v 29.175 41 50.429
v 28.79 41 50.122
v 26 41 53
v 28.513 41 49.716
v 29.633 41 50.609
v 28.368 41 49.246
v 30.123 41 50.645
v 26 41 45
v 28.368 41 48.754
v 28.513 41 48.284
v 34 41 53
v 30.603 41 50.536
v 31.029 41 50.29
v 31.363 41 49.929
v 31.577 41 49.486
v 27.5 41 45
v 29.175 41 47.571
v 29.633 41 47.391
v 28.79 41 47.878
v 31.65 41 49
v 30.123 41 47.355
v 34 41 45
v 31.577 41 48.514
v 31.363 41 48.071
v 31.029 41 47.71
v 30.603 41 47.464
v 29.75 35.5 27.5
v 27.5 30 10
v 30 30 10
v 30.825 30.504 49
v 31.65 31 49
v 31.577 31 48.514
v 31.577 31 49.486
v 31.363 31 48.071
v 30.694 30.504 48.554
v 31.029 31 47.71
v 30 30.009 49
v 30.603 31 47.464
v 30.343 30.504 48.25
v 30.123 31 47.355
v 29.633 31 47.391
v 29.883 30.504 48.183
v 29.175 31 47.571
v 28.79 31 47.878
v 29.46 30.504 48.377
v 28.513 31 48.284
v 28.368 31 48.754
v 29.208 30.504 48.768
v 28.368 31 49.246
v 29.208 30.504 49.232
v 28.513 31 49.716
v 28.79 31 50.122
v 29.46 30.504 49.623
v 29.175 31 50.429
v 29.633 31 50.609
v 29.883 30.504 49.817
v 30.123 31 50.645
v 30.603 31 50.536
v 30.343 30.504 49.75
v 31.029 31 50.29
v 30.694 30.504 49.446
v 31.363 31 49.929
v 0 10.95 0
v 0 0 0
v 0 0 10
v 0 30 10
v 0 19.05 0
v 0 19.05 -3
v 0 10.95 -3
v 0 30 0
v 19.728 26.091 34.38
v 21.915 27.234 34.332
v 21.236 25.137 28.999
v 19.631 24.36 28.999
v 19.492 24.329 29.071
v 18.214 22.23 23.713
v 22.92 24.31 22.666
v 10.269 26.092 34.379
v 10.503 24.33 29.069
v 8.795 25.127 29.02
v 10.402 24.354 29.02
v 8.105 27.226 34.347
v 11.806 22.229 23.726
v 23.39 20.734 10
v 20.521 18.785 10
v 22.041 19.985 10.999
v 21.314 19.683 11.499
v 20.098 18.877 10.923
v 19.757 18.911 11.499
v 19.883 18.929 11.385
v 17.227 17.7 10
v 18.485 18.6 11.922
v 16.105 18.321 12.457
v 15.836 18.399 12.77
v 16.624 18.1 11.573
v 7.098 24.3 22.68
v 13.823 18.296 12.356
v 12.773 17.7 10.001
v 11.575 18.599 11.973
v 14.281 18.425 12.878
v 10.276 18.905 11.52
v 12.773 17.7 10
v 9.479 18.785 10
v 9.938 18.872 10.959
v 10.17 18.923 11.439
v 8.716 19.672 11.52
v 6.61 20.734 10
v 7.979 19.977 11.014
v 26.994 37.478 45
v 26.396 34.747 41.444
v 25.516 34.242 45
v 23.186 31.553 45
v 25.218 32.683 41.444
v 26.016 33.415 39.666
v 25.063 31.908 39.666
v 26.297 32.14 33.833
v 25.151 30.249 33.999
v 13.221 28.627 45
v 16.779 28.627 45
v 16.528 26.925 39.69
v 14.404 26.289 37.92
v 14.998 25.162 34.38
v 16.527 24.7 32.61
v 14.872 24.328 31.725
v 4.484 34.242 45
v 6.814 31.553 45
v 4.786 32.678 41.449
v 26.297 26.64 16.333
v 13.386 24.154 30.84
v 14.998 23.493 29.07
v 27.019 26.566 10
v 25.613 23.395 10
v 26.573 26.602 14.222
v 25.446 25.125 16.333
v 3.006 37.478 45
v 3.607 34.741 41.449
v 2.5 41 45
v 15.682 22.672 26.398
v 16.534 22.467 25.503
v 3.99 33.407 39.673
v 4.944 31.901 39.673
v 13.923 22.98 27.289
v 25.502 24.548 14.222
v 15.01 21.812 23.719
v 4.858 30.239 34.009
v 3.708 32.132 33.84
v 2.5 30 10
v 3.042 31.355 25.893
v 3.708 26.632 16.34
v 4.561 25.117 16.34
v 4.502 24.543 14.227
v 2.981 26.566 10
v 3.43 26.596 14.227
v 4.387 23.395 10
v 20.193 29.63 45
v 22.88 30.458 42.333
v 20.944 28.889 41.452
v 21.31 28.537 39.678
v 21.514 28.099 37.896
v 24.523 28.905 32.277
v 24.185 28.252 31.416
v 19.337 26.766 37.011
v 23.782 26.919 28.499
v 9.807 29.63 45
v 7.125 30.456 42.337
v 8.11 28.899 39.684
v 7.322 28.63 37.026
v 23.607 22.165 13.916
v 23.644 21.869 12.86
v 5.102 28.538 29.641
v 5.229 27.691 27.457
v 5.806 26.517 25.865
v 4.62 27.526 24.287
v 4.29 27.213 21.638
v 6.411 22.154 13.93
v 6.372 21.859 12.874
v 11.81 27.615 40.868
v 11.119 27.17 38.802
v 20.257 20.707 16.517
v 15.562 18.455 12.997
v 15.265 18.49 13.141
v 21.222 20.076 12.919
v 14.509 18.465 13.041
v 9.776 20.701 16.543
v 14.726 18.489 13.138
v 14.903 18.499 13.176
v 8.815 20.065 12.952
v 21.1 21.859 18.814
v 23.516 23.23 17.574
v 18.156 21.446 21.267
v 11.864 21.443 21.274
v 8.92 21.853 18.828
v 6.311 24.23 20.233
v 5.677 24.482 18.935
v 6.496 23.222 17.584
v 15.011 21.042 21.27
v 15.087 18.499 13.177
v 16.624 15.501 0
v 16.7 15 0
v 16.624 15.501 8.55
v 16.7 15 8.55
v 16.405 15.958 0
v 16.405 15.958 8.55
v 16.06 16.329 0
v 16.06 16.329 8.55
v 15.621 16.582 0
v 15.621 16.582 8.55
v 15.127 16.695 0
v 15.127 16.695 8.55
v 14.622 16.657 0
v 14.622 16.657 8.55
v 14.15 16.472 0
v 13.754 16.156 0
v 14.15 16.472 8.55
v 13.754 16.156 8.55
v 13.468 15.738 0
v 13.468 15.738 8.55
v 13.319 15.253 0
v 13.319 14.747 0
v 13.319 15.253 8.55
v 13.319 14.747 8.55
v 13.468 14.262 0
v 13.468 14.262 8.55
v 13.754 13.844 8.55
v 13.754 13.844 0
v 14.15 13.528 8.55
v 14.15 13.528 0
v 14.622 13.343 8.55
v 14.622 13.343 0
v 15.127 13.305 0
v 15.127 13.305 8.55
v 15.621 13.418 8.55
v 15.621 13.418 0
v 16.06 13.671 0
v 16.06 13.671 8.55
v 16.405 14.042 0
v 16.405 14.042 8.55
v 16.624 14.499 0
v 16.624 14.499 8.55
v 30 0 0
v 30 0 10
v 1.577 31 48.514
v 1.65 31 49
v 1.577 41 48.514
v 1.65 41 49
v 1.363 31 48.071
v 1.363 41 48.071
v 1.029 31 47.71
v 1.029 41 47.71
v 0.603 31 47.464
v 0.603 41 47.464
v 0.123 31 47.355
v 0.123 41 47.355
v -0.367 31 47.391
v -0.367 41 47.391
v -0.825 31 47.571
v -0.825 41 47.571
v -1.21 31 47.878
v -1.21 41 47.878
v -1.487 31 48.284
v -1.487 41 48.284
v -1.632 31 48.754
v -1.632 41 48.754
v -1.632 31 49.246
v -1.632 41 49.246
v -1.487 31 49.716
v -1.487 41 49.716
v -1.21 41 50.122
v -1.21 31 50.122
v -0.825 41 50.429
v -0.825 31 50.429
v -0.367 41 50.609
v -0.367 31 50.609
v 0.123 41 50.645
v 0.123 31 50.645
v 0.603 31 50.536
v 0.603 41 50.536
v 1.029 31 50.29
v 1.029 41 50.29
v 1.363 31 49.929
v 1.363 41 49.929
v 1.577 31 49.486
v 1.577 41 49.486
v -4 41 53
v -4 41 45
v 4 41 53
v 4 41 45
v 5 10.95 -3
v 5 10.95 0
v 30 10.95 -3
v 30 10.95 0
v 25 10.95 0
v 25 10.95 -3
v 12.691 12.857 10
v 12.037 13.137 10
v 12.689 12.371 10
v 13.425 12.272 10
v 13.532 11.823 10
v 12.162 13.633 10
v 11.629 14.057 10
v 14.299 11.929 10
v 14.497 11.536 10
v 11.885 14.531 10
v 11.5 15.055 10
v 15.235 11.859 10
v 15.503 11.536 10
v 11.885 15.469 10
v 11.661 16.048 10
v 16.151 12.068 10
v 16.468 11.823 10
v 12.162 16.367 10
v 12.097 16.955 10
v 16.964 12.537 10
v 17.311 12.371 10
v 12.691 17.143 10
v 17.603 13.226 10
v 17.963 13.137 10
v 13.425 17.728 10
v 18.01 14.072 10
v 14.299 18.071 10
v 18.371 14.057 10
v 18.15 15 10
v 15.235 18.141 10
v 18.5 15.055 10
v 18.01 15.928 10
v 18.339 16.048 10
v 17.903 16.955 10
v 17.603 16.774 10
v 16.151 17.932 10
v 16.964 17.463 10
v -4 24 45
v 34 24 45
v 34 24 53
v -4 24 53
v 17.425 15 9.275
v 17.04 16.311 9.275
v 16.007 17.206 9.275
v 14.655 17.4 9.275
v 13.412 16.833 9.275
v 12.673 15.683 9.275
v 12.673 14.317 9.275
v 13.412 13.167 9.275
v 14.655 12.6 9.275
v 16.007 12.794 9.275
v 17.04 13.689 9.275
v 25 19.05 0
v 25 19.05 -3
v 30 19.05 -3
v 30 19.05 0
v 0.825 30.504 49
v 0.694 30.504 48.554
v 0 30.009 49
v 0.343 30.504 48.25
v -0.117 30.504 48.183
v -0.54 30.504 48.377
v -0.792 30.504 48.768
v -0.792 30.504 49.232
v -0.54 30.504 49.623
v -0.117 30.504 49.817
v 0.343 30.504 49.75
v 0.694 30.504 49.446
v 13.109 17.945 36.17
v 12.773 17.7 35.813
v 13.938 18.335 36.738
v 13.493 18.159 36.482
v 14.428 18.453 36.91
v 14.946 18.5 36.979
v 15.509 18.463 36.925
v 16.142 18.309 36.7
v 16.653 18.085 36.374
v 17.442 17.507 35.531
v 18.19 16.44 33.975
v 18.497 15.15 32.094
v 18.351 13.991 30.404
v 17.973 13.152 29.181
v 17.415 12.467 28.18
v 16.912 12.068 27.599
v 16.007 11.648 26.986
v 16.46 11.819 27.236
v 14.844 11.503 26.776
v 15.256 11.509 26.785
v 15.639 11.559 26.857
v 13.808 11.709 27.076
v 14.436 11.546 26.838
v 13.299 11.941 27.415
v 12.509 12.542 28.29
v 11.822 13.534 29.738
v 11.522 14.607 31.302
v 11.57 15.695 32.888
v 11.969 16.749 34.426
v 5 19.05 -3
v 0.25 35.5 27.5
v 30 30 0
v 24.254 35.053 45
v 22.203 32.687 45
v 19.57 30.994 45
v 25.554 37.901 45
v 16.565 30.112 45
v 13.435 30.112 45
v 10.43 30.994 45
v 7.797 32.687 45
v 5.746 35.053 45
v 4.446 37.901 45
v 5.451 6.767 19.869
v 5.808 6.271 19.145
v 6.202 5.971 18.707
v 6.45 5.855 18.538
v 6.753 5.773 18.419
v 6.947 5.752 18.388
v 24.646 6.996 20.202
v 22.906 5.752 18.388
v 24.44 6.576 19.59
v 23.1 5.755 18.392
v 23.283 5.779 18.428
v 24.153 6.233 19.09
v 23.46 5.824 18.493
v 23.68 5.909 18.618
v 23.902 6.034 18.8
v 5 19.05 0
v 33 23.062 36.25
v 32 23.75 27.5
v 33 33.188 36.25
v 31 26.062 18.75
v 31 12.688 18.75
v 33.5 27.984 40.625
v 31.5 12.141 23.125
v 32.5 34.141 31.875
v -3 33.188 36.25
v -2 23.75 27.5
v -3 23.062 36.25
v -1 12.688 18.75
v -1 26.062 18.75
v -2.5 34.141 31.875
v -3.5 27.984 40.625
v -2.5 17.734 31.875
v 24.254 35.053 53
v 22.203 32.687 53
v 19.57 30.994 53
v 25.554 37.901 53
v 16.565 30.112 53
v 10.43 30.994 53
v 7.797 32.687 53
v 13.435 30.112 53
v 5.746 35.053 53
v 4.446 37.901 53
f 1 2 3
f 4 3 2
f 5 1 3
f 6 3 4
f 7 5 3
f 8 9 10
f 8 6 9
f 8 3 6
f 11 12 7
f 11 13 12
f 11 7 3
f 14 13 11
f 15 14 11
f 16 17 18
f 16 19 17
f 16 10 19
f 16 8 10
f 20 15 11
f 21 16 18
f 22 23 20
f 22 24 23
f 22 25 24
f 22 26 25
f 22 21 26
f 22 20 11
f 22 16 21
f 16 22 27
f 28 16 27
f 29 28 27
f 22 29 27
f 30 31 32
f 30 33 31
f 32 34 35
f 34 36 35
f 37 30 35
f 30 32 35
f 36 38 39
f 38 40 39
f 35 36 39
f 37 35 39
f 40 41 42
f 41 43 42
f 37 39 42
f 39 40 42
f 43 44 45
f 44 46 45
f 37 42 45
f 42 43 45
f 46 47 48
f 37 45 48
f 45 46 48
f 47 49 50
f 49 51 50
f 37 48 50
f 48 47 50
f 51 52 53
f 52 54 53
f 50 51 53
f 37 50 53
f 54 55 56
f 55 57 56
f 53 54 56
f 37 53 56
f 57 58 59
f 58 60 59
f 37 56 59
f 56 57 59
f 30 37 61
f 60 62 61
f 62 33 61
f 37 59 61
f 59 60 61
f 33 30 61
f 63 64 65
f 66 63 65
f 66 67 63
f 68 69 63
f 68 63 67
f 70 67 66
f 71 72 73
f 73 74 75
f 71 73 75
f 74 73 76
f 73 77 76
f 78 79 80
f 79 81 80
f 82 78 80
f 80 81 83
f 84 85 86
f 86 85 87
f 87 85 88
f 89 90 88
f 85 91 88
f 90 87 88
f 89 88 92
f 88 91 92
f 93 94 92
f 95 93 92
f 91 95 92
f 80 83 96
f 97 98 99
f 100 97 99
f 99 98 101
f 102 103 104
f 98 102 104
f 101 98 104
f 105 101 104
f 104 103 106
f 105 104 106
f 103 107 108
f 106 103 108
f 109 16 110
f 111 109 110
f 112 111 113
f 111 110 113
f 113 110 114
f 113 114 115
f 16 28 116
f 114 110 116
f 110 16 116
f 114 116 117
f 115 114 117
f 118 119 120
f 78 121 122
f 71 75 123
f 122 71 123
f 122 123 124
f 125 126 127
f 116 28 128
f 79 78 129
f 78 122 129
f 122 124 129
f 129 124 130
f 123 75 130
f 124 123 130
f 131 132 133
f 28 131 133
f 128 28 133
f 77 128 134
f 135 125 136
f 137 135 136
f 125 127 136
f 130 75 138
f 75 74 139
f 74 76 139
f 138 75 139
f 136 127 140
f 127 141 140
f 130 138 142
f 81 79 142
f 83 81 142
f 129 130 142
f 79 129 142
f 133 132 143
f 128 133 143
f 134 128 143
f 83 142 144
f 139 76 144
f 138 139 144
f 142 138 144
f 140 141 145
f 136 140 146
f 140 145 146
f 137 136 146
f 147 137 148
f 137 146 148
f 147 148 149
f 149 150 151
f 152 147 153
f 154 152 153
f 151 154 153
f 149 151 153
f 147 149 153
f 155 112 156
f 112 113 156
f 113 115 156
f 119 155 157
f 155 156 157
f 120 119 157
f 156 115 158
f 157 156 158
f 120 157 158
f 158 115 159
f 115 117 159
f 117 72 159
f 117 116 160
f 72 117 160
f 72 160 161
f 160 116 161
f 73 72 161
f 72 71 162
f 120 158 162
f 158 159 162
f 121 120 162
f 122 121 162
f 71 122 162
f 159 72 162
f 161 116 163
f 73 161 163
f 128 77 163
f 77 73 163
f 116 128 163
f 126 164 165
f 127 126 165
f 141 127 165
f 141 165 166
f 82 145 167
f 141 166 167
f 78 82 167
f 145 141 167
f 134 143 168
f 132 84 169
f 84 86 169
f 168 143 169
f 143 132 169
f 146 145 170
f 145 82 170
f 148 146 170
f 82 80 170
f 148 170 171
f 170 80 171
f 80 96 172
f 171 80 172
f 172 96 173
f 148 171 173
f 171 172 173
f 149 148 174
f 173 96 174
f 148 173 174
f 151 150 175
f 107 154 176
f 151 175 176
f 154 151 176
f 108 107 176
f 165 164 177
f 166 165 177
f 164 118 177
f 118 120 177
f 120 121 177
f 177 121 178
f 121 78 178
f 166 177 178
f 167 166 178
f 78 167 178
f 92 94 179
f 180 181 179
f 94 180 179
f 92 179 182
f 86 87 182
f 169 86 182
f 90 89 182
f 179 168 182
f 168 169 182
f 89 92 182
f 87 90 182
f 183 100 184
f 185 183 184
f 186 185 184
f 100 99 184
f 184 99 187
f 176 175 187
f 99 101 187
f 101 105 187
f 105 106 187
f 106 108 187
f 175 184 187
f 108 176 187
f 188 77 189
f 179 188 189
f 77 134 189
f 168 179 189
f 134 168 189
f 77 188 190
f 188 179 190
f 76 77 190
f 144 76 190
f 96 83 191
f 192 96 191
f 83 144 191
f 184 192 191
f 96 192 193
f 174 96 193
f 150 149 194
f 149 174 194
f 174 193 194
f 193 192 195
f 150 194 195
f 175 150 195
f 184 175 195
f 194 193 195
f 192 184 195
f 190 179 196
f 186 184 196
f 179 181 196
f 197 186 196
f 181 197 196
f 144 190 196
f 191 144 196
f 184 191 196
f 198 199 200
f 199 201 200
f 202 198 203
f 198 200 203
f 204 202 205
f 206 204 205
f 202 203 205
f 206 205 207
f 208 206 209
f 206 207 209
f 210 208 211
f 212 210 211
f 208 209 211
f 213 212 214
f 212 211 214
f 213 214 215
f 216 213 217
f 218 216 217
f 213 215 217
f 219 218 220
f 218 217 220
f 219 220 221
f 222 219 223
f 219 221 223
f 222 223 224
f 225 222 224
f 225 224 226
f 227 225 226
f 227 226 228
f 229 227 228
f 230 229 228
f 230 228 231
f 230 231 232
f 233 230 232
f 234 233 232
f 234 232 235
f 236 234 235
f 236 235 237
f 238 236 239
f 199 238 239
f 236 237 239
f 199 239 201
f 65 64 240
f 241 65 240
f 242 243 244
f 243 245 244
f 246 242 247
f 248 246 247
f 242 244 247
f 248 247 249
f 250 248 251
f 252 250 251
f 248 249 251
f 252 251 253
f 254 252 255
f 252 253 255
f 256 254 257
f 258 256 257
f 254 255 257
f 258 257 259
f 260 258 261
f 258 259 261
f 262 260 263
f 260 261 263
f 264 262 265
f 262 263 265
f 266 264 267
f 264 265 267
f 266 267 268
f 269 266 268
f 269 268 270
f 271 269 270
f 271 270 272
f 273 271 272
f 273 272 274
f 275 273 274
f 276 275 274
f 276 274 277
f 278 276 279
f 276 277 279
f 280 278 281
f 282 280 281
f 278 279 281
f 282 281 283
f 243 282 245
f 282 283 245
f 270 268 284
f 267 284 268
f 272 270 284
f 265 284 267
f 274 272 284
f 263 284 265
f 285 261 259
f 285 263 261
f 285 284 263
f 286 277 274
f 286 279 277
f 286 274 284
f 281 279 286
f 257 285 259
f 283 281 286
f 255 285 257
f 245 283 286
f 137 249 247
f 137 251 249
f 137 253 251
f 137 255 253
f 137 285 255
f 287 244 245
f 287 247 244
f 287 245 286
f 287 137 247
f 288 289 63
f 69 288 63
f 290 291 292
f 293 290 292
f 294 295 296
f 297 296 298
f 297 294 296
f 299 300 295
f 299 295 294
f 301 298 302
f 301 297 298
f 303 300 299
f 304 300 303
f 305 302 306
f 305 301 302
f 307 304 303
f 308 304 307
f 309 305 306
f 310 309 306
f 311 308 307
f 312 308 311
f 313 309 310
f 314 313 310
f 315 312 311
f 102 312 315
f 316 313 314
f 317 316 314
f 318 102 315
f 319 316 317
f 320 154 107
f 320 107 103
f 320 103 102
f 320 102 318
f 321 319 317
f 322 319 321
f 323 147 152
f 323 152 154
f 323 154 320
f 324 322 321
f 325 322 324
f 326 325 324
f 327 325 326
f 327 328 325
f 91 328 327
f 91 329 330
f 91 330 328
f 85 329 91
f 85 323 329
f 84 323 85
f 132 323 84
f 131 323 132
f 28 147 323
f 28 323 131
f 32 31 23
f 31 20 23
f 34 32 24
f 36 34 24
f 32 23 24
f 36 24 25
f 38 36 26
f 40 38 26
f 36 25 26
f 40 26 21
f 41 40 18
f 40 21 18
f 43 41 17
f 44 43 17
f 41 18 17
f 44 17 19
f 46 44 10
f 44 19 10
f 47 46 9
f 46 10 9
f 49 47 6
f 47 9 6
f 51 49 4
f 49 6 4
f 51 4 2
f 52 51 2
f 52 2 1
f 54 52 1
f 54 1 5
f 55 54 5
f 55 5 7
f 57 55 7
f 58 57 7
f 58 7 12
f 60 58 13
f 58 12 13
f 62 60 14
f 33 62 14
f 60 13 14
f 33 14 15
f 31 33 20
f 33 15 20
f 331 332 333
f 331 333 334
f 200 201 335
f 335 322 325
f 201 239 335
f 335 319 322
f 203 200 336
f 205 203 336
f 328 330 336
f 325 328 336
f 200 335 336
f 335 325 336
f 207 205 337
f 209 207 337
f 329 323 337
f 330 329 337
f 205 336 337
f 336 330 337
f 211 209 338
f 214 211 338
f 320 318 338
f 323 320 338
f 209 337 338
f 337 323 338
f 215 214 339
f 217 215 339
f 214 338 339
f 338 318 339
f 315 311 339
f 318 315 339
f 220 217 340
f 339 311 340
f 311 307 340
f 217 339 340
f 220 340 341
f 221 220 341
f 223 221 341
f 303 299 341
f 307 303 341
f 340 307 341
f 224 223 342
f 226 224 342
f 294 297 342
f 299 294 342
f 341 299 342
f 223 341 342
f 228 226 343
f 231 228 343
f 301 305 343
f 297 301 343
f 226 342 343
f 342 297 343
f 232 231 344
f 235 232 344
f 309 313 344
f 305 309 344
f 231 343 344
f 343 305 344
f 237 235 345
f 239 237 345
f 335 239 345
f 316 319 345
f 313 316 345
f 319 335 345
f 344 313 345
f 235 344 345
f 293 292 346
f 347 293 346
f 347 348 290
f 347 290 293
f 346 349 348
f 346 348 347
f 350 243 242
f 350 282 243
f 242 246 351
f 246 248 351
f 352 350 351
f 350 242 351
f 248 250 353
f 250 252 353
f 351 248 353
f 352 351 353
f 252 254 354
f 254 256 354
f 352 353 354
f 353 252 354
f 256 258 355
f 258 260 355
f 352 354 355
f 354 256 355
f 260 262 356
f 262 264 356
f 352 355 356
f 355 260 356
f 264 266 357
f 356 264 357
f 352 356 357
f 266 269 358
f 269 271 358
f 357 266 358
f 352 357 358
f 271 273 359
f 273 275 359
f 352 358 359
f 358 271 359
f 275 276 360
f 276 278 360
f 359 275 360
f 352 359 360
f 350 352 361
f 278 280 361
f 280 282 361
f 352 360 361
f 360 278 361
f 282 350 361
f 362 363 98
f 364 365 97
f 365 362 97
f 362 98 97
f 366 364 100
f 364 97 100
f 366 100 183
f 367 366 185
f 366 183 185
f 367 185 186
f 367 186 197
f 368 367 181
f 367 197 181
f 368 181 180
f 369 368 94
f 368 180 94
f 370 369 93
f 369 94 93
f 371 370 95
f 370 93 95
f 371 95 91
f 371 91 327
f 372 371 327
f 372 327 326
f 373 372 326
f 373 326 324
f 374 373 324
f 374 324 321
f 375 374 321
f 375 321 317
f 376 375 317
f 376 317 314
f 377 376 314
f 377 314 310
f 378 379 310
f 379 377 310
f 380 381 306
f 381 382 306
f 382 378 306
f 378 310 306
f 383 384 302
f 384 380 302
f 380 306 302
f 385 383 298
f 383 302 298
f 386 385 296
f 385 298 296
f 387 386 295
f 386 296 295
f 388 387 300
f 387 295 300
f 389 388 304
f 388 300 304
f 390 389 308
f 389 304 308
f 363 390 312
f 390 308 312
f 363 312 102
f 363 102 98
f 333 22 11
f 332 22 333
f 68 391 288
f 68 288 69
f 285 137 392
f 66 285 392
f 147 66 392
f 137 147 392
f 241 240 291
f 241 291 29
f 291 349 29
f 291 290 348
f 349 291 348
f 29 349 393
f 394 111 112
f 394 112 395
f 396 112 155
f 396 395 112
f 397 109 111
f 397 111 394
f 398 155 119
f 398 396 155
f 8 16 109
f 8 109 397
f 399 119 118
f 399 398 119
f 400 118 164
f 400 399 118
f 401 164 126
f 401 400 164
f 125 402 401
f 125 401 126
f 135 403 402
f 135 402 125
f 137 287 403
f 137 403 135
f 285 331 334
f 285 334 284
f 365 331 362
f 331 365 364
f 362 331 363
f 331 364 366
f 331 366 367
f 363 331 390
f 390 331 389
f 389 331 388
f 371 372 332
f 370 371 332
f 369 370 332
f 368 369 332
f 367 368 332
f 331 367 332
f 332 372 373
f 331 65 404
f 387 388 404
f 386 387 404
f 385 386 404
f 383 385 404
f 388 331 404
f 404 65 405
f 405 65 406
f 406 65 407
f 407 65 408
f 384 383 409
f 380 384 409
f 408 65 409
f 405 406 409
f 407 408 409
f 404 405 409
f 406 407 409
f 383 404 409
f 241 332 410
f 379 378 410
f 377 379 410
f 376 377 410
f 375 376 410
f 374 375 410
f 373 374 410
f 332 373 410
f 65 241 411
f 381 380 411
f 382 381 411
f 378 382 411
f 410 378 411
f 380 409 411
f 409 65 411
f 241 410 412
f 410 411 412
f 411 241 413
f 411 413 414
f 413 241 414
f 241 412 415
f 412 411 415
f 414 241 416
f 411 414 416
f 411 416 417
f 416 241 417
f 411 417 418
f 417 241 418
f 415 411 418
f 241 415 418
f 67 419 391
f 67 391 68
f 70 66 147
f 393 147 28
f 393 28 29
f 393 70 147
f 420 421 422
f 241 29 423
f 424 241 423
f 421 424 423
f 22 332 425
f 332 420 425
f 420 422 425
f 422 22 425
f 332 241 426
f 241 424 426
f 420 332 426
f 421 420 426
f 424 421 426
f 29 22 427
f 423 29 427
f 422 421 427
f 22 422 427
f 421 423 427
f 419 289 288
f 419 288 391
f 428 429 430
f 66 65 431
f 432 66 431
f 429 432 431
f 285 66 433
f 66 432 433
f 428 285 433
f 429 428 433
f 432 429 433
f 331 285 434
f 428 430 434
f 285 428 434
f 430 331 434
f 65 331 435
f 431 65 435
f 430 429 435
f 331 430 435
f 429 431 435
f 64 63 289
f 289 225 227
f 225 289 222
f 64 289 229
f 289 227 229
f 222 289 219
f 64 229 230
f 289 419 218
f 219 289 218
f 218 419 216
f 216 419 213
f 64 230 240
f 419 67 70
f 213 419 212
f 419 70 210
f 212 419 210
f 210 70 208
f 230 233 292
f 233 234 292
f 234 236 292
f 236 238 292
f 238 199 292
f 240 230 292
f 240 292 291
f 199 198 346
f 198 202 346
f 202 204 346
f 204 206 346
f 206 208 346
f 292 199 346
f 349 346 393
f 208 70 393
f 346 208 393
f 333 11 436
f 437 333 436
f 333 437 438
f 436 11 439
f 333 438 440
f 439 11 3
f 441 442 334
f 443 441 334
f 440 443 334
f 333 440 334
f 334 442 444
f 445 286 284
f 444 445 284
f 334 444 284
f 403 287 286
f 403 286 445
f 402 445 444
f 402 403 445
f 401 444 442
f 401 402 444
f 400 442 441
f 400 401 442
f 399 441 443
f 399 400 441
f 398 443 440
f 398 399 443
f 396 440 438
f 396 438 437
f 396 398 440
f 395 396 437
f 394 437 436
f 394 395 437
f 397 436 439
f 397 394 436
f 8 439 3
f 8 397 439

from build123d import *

# Parameters (mm, degrees)
SKETCH_1_W          = 30
SKETCH_1_H          = 30
EXTRUDE_1_DEPTH     = 10
EXTRUDE_3_DEPTH     = 8
SKETCH_11_R         = 3.5
CUT_EXTRUDE_2_DEPTH = 69.45436447
SKETCH_12_W         = 5
SKETCH_12_H         = 8.1
EXTRUDE_4_DEPTH     = 3


with BuildPart() as part:
    # 草图1 → 凸台-拉伸1 (new body)
    with BuildSketch(Plane.XY):
        with Locations((15, 15)):
            Rectangle(SKETCH_1_W, SKETCH_1_H)
    extrude(amount=EXTRUDE_1_DEPTH)

    # 高级异型孔1: read off the stored shape, not the designer's step
    # 高级异型孔1 outline → 高级异型孔1 (revolve, cut)
    with BuildSketch(Plane(origin=(15, 15, 0), x_dir=(1, 0, 0), z_dir=(0, -1, 0))):
        Polygon((3.15, 10), (0, 10), (0, 0), (1.7, 0), (1.7, 8.55), align=None)
    revolve(axis=Axis((15, 15, 0), (0, 0, 1)), mode=Mode.SUBTRACT)



with BuildPart() as body_2:
    # 草图2 → 凸台-拉伸3 (new body)
    with BuildSketch(Plane.XY.offset(45)):
        with BuildLine():
            Line((-4, 41), (4, 41))
            ThreePointArc((4, 41), (15, 30), (26, 41))
            Line((26, 41), (34, 41))
            Line((34, 41), (34, 24))
            Line((34, 24), (-4, 24))
            Line((-4, 24), (-4, 41))
        make_face()
    extrude(amount=EXTRUDE_3_DEPTH)


with BuildPart() as part_1:
    add(part.part)

    add(body_2.part)  # 放样2 merges body 2
    # 草图3 → 放样2 section 0
    with BuildSketch(Plane(origin=(0, 0, 45), x_dir=(-1, 0, 0), z_dir=(0, 0, -1))):
        with BuildLine():
            Line((-34, 41), (-27.5, 41))
            ThreePointArc((-27.5, 41), (-15, 28.5), (-2.5, 41))
            Line((-2.5, 41), (4, 41))
            Line((4, 41), (4, 24))
            Line((4, 24), (-34, 24))
            Line((-34, 24), (-34, 41))
        make_face()
    # 草图5 → 放样2 section 1
    with BuildSketch(Plane.XY.offset(10)):
        with BuildLine():
            Line((27.5, 30), (30, 30))
            Line((30, 30), (30, 0))
            Line((30, 0), (0, 0))
            Line((0, 0), (0, 30))
            Line((0, 30), (2.5, 30))
            ThreePointArc((2.5, 30), (15, 17.5), (27.5, 30))
        make_face()
    loft()

    # 草图11 → 切除-拉伸2 (cut, through all)
    with BuildSketch(Plane(origin=(0, 0, 10), x_dir=(-1, 0, 0), z_dir=(0, 0, -1))):
        with Locations(Location((-15, 15, 0), (0, 0, 50.487533502))):
            Circle(SKETCH_11_R)
    extrude(amount=-CUT_EXTRUDE_2_DEPTH, mode=Mode.SUBTRACT)

    # 草图12 → 凸台-拉伸4 (add)
    with BuildSketch(Plane(origin=(0, 0, 0), x_dir=(-1, 0, 0), z_dir=(0, 0, -1))):
        with Locations((-27.5, 15)):
            Rectangle(SKETCH_12_W, SKETCH_12_H)
        with Locations((-2.5, 15)):
            Rectangle(SKETCH_12_W, SKETCH_12_H)
    extrude(amount=EXTRUDE_4_DEPTH)

    # 高级异型孔4: read off the stored shape, not the designer's step
    # 高级异型孔4 outline → 高级异型孔4 (revolve, cut)
    with BuildSketch(Plane(origin=(30, 0, 49), x_dir=(1, 0, 0), z_dir=(0, 0, 1))):
        Polygon((0, 30.008579979), (1.65, 31), (1.65, 41), (0, 41), align=None)
    revolve(axis=Axis((30, 0, 49), (0, 1, 0)), mode=Mode.SUBTRACT)

    # Other 4 2 outline → Other 4 2 (revolve, cut)
    with BuildSketch(Plane.XY.offset(49)):
        Polygon((0, 30.008579979), (1.65, 31), (1.65, 41), (0, 41), align=None)
    revolve(axis=Axis((0, 0, 49), (0, 1, 0)), mode=Mode.SUBTRACT)


solid = part_1.part
